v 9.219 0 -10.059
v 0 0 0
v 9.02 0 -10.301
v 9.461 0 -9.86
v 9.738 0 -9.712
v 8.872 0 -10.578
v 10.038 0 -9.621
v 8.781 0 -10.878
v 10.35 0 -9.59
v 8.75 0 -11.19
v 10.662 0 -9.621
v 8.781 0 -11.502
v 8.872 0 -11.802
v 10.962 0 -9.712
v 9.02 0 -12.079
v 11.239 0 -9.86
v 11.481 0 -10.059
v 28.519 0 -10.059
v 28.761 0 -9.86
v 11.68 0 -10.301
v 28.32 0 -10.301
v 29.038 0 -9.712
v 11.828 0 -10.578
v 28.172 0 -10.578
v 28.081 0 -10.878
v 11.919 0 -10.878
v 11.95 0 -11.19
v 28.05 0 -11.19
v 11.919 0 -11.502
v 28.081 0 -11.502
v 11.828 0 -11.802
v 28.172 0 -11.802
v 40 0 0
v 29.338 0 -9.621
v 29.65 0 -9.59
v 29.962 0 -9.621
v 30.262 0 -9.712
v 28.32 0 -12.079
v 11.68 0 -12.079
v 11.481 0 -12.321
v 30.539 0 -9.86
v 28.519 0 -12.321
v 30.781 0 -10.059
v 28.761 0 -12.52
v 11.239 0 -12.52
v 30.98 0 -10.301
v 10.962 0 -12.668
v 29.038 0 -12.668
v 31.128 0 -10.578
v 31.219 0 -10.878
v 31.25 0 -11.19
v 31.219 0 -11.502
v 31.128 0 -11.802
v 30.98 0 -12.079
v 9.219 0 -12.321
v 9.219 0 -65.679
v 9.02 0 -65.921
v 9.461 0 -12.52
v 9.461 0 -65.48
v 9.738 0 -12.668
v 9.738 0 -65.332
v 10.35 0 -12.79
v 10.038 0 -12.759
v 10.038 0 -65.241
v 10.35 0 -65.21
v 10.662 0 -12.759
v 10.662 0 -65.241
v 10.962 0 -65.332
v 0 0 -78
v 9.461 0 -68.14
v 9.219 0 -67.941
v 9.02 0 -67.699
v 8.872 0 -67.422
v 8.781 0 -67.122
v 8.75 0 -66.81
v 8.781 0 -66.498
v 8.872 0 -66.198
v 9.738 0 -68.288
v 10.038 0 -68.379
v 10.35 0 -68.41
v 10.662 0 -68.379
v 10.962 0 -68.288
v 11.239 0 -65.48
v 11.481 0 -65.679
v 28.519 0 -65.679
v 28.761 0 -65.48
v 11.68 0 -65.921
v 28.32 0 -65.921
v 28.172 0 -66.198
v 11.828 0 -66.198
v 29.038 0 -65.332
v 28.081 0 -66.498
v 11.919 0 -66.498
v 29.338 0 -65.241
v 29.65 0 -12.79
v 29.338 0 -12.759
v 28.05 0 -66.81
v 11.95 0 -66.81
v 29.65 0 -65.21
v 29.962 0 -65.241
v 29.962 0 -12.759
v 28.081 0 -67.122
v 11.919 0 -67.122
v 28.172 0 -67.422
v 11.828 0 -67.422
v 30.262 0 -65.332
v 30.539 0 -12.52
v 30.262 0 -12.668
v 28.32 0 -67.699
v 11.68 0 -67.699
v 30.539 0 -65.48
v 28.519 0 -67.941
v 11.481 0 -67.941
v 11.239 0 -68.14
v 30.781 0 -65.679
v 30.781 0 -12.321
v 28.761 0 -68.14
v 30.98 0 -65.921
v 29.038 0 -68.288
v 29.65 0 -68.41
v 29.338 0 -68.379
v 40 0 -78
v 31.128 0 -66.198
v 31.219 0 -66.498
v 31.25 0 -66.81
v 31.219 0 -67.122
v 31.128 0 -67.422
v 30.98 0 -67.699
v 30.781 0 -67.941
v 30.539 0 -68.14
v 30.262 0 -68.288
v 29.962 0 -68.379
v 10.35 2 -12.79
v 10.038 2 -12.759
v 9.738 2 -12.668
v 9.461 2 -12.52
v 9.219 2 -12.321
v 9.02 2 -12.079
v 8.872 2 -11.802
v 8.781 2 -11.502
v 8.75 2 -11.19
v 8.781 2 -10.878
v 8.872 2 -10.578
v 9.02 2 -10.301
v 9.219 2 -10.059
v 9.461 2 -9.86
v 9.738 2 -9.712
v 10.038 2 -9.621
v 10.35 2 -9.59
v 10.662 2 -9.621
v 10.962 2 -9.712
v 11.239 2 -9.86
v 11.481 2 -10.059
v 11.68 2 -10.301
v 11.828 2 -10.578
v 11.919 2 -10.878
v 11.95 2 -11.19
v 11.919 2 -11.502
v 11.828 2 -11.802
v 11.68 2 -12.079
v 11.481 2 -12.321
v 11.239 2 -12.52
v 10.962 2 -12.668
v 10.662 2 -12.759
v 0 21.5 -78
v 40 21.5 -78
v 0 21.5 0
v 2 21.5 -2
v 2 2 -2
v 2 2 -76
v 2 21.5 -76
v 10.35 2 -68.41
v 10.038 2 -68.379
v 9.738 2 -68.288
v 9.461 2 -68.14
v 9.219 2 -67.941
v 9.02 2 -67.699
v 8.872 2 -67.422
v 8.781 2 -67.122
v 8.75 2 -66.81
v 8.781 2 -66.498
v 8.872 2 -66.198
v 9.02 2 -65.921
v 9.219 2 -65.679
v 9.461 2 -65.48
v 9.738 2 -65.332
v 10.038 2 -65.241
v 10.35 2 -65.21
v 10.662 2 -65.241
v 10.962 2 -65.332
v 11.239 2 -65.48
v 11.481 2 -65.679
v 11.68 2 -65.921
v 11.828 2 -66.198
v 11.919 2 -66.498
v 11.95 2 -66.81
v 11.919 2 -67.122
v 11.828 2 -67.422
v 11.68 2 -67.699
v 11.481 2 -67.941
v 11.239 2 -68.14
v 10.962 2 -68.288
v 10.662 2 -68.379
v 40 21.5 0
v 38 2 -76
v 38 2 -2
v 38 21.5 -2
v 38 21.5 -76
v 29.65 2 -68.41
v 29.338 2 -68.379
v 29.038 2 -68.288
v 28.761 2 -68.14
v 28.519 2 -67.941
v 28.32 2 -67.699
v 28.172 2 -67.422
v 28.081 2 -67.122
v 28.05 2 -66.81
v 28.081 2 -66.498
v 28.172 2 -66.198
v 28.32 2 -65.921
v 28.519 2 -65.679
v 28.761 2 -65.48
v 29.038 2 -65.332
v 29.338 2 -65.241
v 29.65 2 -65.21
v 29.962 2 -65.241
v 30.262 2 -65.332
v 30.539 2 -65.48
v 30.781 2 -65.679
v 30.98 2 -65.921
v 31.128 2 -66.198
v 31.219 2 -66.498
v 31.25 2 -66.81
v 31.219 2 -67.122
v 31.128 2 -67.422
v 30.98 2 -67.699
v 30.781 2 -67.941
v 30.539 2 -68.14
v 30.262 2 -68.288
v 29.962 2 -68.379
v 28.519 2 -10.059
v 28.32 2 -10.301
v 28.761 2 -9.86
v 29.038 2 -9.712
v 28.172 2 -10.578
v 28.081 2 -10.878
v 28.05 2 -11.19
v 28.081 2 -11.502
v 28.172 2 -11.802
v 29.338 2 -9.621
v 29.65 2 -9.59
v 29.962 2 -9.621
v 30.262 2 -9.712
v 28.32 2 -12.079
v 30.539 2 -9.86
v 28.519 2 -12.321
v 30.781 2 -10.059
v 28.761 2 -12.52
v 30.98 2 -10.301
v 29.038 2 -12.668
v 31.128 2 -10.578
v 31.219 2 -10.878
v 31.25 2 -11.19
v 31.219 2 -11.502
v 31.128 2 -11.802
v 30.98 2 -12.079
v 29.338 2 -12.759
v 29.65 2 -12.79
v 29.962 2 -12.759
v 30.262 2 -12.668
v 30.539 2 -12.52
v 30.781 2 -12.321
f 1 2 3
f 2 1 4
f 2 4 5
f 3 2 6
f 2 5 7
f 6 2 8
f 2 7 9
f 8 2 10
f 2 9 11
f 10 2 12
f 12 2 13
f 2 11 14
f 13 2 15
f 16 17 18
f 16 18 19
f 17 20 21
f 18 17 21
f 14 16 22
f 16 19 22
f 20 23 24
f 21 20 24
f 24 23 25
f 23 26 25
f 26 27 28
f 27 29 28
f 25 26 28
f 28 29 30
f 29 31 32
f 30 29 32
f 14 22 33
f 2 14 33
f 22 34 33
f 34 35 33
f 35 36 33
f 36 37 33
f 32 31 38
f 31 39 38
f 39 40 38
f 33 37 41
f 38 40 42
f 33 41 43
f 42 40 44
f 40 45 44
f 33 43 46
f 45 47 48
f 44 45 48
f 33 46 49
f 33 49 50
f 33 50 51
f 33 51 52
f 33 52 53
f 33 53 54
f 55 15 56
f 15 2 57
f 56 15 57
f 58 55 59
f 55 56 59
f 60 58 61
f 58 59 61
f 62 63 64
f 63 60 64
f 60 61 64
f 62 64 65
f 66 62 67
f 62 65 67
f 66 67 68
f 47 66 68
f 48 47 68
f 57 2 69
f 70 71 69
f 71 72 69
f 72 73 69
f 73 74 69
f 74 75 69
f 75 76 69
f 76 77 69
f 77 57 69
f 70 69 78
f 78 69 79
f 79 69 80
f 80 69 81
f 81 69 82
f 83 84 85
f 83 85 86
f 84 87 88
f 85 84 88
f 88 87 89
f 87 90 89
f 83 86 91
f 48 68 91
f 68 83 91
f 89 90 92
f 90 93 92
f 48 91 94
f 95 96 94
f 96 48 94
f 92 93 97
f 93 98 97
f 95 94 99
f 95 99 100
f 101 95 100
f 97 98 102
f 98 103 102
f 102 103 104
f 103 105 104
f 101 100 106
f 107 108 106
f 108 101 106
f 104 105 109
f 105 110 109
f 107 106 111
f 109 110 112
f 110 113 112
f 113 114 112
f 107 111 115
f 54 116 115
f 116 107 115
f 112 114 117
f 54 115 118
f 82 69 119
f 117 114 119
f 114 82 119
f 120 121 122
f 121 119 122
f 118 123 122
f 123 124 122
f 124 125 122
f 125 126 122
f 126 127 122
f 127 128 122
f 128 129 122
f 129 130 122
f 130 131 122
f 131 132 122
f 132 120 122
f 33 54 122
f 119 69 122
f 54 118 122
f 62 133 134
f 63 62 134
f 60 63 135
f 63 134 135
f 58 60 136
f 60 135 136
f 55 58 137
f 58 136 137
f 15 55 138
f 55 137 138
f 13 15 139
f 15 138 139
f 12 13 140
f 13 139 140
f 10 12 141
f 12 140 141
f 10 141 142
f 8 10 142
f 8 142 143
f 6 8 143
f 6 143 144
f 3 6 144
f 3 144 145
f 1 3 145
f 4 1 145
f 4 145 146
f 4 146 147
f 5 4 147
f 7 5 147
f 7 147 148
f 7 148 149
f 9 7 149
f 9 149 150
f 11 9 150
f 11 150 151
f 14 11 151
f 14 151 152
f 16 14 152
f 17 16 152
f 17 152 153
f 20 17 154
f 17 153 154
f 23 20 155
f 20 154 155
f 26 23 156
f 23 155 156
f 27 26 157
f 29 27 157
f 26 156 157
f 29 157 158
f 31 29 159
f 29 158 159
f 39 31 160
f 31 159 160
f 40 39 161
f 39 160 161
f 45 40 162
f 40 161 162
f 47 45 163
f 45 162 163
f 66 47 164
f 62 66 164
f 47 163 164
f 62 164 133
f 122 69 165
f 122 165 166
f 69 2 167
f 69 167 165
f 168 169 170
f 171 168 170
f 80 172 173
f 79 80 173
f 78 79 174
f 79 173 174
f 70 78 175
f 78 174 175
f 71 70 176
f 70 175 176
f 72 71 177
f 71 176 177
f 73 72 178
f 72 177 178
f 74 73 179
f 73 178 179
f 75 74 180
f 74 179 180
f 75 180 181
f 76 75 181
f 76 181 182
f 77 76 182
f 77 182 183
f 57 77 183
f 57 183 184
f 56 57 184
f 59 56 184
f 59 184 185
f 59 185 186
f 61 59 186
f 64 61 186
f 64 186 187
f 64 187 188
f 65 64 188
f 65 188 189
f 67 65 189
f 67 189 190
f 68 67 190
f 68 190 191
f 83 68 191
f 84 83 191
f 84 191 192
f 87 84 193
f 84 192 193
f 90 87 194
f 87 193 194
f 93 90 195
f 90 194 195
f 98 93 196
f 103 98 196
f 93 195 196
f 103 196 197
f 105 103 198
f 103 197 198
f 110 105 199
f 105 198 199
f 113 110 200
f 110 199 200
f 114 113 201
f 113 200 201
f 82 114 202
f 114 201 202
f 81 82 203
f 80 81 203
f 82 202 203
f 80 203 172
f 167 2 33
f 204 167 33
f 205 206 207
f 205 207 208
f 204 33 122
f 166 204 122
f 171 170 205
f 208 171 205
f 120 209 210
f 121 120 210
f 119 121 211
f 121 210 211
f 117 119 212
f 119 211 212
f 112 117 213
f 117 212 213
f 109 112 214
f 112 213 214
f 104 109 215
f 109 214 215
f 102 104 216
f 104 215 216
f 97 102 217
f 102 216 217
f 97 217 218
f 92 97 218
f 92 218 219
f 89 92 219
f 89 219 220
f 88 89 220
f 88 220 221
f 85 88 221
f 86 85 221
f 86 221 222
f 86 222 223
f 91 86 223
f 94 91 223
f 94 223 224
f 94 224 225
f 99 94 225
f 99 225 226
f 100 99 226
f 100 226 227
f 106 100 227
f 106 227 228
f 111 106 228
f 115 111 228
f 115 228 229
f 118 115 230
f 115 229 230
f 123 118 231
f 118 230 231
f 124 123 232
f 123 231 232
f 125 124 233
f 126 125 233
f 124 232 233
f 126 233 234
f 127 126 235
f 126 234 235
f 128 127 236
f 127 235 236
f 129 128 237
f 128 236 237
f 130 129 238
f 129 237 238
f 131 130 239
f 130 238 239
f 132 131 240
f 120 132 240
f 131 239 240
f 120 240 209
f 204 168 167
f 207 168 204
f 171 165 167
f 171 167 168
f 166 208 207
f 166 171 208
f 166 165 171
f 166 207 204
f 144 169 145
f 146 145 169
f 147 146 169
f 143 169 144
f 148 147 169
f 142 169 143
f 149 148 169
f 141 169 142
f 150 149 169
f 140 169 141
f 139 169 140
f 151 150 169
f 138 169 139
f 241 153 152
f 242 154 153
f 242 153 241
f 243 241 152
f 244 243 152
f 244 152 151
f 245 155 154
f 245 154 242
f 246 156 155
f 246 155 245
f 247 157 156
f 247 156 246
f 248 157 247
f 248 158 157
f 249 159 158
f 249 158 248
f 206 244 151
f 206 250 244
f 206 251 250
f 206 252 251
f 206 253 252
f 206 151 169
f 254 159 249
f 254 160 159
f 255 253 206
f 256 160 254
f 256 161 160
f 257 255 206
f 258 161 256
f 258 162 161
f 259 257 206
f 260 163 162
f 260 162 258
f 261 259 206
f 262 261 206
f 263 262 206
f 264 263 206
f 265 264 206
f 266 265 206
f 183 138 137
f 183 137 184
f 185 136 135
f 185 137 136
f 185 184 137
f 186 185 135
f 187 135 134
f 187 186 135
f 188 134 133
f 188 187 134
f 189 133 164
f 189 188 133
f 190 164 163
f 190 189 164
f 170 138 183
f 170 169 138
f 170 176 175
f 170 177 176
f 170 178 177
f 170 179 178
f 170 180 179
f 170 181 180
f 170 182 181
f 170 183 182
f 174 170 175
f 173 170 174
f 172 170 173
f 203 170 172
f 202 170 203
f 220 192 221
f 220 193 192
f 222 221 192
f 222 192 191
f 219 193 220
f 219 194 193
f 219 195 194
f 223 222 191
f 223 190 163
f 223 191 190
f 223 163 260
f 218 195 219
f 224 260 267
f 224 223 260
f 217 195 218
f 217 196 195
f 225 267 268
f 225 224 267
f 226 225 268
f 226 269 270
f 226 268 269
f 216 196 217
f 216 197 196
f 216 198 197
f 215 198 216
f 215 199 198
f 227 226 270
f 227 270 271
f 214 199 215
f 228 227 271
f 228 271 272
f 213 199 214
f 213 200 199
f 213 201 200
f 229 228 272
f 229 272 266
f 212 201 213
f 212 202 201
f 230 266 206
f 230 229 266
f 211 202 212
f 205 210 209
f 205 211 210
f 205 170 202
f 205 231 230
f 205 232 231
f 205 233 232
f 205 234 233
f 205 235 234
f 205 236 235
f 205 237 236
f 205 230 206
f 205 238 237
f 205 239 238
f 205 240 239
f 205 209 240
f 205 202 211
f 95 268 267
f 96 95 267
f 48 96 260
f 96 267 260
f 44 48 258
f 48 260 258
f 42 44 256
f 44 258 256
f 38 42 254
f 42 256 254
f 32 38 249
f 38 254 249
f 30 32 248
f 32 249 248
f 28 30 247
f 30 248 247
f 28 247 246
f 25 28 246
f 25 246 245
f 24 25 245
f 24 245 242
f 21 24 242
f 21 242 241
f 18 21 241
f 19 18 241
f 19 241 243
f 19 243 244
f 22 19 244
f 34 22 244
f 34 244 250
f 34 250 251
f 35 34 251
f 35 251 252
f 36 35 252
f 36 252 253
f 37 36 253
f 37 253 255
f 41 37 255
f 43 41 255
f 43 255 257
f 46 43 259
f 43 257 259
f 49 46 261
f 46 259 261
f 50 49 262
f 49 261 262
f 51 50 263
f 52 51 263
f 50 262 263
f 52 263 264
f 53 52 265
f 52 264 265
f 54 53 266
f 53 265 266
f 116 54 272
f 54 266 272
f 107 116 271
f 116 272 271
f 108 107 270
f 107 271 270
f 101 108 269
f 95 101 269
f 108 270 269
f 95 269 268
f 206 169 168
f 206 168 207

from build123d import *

# Parameters (mm, degrees)
SKETCH_1_W          = 40
SKETCH_1_H          = 78
EXTRUDE_1_DEPTH     = 21.5
SHELL_1_T           = -2
SKETCH_2_R          = 1.6
CUT_EXTRUDE_1_DEPTH = 40


with BuildPart() as part:
    # Эскиз1 → Бобышка-Вытянуть1 (new body)
    with BuildSketch(Plane(origin=(0, 0, 0), x_dir=(1, 0, 0), z_dir=(0, 1, 0))):
        with Locations((20, 39)):
            Rectangle(SKETCH_1_W, SKETCH_1_H)
    extrude(amount=EXTRUDE_1_DEPTH)

    # Оболочка1
    shell_1_openings = [part.faces().sort_by_distance(p)[0] for p in [
        (20, 21.5, -39),
    ]]
    offset(amount=SHELL_1_T, openings=shell_1_openings, kind=Kind.INTERSECTION)

    # Эскиз2 → Вырез-Вытянуть1 (cut)
    with BuildSketch(Plane(origin=(0, 21.5, 0), x_dir=(1, 0, 0), z_dir=(0, 1, 0))):
        with Locations(Location((10.35, 66.81, 0), (0, 0, 90))):
            Circle(SKETCH_2_R)
        with Locations(Location((29.65, 66.81, 0), (0, 0, 90))):
            Circle(SKETCH_2_R)
        with Locations(Location((29.65, 11.19, 0), (0, 0, 90))):
            Circle(SKETCH_2_R)
        with Locations(Location((10.35, 11.19, 0), (0, 0, 90))):
            Circle(SKETCH_2_R)
    extrude(amount=-CUT_EXTRUDE_1_DEPTH, mode=Mode.SUBTRACT)


solid = part.part
